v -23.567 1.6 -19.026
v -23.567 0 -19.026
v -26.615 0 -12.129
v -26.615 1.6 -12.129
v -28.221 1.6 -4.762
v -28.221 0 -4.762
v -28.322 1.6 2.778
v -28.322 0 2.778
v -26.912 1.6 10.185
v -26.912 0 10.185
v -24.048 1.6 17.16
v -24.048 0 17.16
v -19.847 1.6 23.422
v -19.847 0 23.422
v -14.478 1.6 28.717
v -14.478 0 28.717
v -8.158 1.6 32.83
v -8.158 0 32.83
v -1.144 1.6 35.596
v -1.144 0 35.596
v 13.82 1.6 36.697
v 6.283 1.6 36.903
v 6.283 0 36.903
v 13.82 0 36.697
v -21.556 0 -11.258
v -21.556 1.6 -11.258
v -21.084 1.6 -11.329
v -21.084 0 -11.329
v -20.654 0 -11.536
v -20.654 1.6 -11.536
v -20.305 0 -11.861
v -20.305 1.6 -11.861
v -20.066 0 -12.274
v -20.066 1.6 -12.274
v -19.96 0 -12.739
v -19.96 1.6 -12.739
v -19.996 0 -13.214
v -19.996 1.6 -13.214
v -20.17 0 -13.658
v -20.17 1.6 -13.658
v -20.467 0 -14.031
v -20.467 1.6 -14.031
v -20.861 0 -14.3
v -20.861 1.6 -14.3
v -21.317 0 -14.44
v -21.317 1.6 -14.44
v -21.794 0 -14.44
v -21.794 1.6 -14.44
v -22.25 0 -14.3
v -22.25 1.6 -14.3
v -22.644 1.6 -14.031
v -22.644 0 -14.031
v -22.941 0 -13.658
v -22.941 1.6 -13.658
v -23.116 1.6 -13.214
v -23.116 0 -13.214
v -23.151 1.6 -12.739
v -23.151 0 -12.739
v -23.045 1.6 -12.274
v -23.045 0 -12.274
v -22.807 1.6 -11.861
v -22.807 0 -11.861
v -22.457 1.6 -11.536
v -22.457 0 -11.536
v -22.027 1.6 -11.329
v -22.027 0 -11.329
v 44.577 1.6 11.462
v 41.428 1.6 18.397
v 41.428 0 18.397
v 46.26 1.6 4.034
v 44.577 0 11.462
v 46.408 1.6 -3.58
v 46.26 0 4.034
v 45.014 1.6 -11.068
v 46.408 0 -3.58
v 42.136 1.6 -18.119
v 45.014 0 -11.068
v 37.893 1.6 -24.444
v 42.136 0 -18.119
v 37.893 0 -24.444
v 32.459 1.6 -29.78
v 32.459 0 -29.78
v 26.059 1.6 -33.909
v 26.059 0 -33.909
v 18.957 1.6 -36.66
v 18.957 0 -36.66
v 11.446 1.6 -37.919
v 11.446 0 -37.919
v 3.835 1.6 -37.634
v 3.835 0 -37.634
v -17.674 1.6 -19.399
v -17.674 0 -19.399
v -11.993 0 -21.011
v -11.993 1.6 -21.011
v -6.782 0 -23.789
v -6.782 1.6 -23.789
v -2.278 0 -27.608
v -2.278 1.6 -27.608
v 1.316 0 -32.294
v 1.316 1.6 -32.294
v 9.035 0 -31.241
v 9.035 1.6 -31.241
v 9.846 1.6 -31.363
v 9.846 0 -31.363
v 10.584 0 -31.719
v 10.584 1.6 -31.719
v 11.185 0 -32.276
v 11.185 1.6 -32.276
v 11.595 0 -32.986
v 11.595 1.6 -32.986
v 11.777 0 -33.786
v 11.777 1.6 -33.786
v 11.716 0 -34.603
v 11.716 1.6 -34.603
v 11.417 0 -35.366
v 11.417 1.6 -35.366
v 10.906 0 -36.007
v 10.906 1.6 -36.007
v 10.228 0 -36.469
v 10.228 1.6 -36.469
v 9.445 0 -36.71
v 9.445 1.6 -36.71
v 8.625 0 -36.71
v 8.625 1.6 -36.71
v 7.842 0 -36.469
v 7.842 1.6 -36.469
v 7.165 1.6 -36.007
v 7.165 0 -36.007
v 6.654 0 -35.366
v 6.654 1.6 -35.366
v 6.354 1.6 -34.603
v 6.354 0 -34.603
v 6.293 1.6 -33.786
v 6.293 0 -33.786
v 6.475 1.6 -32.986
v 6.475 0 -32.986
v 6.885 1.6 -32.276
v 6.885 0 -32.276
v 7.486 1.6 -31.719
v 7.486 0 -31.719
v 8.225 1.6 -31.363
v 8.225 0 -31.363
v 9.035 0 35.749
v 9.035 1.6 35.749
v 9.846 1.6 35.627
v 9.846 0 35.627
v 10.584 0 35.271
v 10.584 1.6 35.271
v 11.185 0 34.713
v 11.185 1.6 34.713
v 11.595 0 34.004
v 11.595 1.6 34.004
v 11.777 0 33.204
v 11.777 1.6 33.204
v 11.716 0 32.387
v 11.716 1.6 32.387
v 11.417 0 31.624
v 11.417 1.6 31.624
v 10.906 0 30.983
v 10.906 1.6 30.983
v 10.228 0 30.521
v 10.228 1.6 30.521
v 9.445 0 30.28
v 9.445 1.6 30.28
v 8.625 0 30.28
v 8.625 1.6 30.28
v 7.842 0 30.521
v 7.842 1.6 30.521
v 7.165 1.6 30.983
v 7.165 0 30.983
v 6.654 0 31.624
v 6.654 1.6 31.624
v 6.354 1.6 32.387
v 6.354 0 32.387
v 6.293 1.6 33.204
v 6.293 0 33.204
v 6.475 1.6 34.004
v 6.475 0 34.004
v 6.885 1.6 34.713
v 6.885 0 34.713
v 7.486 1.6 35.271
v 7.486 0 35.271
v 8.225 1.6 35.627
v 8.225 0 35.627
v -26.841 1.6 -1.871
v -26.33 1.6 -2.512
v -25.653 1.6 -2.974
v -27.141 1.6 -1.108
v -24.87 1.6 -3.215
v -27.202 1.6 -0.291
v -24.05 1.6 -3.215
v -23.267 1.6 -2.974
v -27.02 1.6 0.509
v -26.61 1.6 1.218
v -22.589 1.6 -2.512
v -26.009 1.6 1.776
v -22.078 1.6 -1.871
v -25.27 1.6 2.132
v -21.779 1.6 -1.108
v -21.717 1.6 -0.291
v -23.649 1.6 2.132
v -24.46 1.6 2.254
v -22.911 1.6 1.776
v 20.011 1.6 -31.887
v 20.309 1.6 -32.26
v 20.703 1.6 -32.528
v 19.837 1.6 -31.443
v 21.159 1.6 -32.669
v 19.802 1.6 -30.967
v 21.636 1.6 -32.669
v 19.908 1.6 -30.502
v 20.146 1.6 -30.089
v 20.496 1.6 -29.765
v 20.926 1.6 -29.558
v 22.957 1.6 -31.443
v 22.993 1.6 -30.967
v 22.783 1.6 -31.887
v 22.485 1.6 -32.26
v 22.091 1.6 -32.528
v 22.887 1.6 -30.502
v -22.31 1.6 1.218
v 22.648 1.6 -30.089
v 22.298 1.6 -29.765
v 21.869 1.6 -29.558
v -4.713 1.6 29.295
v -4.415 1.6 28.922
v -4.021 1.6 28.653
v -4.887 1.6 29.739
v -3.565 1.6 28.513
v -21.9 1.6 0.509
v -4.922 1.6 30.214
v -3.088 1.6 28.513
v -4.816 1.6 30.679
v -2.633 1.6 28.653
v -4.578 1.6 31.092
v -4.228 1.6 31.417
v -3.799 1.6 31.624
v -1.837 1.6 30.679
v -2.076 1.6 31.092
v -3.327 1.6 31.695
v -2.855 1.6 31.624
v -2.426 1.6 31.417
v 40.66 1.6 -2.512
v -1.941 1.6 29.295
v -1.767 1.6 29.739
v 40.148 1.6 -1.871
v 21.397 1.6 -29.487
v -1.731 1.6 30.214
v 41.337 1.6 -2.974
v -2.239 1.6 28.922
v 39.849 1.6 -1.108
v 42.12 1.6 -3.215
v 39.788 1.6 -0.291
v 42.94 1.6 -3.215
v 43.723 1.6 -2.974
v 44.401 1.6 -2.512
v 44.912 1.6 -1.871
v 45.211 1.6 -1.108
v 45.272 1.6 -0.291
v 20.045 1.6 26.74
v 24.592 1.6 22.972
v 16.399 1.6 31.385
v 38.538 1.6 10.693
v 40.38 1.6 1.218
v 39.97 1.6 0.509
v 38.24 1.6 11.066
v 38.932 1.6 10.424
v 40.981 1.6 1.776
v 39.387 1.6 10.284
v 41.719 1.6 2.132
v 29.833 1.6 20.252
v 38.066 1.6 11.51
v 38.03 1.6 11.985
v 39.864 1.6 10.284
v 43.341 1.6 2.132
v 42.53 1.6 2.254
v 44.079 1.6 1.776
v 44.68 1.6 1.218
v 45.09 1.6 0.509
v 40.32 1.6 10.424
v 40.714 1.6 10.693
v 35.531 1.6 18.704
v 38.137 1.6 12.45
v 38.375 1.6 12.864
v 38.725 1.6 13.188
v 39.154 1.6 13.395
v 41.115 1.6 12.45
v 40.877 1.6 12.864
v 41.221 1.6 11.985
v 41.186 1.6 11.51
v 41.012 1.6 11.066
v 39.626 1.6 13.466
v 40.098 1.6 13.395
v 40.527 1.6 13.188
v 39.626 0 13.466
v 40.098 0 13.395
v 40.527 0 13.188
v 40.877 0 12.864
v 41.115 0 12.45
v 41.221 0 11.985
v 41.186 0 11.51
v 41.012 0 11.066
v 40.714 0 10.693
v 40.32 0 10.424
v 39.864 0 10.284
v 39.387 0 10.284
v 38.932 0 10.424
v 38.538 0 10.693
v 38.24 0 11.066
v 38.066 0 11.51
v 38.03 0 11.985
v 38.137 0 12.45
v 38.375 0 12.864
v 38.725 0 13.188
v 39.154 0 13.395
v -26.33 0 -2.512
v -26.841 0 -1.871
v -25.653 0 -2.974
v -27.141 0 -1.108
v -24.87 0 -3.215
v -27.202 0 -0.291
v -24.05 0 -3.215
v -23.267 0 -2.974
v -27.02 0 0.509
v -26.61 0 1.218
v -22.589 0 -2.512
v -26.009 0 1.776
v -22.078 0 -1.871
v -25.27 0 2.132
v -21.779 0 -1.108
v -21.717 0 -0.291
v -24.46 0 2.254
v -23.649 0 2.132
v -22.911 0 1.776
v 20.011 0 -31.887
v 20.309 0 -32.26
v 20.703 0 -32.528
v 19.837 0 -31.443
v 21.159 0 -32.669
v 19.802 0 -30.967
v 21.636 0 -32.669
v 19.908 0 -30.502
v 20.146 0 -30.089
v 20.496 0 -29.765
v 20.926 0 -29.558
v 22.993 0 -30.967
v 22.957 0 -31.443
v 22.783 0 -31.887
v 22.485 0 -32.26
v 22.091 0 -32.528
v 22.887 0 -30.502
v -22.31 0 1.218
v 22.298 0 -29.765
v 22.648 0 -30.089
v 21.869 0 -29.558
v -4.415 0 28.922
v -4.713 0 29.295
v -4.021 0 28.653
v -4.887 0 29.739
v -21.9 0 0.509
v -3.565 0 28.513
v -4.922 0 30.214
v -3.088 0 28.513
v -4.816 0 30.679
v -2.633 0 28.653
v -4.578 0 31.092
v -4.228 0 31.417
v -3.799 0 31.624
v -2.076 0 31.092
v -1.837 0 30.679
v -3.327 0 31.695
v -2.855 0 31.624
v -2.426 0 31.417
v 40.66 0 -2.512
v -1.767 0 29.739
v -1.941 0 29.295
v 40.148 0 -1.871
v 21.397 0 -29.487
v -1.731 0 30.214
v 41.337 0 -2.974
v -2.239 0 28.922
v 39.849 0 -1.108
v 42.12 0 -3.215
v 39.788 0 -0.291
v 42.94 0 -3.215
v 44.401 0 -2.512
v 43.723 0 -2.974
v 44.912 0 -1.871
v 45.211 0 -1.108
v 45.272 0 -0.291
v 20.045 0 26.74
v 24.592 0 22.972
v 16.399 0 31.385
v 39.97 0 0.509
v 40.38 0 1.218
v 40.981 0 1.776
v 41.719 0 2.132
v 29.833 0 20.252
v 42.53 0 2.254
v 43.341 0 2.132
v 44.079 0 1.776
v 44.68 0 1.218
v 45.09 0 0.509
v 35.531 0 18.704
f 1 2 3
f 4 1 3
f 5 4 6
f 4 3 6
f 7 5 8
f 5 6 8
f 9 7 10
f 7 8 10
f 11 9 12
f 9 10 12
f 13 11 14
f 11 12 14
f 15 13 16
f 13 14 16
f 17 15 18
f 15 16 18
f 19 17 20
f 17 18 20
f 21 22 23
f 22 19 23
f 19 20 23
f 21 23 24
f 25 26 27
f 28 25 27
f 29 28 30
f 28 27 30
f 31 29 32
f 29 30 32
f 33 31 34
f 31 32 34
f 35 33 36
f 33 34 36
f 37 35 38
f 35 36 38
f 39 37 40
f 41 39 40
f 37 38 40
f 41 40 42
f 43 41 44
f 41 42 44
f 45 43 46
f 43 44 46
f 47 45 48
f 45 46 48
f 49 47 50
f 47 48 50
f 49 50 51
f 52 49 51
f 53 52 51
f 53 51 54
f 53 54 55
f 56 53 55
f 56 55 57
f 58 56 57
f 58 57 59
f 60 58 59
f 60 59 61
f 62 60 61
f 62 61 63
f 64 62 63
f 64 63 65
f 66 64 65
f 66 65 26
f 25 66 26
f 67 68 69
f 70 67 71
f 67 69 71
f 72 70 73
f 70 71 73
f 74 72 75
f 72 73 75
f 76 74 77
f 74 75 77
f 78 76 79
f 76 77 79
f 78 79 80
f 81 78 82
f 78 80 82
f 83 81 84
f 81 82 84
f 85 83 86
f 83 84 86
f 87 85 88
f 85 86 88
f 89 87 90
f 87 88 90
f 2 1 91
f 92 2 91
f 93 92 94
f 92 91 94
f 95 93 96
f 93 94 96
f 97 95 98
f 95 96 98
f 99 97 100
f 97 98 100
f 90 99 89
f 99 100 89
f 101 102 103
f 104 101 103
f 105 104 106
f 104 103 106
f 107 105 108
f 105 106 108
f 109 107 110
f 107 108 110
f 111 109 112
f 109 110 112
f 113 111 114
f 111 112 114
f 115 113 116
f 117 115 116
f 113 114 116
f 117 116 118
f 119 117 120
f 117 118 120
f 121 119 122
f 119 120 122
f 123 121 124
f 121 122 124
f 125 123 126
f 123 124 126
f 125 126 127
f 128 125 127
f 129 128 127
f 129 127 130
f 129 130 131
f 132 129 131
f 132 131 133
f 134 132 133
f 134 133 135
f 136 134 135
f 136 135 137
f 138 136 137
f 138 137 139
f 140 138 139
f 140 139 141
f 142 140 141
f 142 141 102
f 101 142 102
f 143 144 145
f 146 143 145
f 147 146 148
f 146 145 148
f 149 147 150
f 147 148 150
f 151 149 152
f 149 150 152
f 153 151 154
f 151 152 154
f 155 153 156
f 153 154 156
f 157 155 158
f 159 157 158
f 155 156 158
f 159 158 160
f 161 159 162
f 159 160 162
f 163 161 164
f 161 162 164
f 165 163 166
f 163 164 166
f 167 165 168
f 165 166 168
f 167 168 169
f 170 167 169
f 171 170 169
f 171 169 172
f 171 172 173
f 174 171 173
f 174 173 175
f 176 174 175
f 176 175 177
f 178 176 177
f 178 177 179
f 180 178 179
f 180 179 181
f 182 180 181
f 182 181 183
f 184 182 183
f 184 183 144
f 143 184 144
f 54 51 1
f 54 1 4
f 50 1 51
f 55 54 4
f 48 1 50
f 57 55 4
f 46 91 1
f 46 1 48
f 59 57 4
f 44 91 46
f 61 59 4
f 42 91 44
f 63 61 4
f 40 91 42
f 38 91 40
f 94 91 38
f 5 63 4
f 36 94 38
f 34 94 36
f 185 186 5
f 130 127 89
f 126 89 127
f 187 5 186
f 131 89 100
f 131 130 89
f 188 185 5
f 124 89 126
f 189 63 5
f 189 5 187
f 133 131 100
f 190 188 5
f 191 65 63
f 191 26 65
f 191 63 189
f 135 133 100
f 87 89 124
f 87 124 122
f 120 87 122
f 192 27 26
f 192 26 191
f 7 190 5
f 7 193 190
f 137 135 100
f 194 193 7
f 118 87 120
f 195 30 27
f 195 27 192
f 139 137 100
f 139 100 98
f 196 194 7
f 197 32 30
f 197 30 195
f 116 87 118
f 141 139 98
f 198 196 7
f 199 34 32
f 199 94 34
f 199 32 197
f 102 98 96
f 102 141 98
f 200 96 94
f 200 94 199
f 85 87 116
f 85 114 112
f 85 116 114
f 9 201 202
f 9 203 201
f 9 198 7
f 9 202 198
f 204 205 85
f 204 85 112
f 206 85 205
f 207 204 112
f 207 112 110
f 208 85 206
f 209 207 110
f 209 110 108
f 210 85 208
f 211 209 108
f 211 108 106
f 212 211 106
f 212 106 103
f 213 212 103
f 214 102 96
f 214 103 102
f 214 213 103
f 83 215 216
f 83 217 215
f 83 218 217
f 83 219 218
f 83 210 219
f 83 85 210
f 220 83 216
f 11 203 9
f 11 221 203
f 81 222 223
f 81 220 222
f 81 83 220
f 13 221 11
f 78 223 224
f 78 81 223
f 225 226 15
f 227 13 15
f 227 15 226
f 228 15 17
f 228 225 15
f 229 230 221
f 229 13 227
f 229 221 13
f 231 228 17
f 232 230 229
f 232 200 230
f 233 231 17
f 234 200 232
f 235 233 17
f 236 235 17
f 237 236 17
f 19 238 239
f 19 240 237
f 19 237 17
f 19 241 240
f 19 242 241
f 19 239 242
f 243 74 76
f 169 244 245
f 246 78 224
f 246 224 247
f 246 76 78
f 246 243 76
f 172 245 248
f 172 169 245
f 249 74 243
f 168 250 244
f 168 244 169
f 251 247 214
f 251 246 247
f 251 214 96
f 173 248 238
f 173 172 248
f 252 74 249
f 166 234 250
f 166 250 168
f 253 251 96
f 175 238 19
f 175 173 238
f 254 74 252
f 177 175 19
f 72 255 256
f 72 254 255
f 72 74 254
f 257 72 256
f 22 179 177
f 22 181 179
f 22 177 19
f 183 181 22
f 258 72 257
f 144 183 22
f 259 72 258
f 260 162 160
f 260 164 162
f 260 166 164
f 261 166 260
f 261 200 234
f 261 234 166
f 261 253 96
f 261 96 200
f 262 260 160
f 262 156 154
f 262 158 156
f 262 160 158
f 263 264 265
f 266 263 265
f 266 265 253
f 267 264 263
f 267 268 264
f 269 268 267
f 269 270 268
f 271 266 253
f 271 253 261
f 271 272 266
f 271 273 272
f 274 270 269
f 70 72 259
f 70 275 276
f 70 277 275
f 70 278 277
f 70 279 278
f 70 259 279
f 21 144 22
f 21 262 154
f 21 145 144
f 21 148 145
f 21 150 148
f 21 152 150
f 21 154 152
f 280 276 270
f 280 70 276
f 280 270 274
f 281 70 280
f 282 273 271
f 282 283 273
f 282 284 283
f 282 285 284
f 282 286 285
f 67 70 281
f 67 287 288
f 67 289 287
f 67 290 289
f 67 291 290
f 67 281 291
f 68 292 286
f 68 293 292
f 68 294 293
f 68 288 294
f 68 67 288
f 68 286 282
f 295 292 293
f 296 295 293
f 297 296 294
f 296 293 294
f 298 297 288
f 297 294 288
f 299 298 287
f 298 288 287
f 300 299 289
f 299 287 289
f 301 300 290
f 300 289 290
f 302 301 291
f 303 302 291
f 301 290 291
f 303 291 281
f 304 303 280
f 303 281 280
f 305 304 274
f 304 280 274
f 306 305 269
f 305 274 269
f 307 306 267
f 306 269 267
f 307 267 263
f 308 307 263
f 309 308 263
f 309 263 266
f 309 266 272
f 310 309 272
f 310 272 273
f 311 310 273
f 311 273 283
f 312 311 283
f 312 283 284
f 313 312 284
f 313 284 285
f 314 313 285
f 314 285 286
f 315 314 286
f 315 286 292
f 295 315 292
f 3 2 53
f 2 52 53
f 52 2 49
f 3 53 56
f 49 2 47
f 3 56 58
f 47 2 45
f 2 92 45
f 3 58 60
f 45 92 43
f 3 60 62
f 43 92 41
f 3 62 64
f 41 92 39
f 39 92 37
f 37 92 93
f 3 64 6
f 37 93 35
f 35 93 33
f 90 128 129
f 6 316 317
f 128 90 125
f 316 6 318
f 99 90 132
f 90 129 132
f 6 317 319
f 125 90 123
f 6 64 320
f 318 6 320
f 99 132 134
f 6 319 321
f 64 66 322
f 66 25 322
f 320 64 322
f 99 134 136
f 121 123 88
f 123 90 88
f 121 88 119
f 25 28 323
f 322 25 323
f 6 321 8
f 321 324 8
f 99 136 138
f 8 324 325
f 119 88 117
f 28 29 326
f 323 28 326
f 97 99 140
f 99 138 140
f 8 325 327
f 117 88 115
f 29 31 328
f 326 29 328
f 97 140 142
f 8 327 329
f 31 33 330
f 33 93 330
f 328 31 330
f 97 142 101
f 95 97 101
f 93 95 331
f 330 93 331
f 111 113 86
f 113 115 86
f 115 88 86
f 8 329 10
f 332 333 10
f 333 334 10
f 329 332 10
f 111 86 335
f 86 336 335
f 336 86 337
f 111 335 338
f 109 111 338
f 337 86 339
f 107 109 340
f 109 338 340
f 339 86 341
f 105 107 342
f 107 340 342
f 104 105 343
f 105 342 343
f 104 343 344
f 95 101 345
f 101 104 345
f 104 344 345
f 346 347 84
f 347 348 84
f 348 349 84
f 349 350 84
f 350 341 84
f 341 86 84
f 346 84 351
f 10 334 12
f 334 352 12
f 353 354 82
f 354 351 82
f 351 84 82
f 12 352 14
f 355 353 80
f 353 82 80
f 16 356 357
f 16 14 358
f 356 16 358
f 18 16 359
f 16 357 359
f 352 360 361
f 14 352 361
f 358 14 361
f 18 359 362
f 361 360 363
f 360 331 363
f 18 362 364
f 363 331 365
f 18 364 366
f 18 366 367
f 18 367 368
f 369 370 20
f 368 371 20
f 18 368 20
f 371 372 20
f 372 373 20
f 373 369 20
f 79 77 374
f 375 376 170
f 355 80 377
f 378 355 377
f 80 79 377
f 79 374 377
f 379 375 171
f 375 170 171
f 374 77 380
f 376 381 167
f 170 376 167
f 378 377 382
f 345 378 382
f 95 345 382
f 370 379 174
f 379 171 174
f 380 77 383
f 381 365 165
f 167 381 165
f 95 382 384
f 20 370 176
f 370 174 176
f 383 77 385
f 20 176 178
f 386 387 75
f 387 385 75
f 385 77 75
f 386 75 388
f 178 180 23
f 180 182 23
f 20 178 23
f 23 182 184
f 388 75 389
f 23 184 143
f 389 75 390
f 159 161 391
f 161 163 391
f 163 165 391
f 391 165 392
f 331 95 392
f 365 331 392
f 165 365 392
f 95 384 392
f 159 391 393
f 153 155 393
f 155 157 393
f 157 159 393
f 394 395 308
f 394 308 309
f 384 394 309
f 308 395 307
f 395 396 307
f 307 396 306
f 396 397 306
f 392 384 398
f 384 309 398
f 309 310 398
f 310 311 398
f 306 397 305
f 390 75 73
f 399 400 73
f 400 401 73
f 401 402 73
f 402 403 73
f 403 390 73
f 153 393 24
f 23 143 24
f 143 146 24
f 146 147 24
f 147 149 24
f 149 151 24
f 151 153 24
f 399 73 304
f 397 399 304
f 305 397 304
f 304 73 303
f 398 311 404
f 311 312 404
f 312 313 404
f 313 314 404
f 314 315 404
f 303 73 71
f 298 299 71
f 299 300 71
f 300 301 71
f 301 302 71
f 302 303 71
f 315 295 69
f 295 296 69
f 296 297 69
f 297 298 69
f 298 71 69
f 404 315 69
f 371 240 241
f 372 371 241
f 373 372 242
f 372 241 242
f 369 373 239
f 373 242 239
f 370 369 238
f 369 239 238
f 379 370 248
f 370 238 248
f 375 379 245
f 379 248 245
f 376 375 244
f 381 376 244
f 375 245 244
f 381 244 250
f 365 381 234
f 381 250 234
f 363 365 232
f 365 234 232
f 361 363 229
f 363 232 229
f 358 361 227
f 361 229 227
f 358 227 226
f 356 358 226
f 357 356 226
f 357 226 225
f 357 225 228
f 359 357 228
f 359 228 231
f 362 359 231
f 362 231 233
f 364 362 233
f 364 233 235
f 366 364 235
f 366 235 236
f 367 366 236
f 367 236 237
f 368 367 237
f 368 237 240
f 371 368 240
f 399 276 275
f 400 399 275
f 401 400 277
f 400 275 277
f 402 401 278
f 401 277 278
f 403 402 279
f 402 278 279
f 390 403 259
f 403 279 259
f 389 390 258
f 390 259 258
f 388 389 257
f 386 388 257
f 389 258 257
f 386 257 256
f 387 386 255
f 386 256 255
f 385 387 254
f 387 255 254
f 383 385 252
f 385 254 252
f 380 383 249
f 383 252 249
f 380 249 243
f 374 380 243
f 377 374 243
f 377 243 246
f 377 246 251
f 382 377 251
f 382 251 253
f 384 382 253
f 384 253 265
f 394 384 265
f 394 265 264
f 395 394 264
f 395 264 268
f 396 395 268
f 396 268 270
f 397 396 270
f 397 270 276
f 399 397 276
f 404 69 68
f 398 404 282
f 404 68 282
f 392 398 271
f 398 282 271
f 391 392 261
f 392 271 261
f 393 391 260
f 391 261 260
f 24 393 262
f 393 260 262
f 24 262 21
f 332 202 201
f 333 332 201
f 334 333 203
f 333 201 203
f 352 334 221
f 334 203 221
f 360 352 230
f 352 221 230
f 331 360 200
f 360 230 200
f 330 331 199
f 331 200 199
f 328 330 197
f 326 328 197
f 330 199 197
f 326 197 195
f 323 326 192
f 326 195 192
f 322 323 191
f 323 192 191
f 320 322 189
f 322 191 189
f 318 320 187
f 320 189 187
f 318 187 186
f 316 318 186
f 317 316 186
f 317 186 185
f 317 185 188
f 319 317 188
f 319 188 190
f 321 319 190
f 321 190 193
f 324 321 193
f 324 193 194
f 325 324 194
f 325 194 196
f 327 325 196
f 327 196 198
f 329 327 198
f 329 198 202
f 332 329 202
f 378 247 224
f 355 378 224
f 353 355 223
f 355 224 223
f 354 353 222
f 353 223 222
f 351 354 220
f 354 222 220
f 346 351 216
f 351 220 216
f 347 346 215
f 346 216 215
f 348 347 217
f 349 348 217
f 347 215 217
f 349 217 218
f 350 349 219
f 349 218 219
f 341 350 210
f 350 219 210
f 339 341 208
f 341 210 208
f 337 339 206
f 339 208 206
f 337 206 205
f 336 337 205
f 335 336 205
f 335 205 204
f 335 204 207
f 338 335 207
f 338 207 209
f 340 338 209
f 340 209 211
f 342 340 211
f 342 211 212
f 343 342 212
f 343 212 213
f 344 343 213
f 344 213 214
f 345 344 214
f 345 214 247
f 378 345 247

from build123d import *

# Parameters (mm, degrees)
SKETCH1_R           = 37.5
BOSS_EXTRUDE1_DEPTH = 1.6
SKETCH3_R           = 1.6
SKETCH3_R_2         = 2.75
CUT_EXTRUDE1_DEPTH  = 10
SKETCH6_R           = 27.729942467
CUT_EXTRUDE2_DEPTH  = 10


with BuildPart() as part:
    # Sketch1 → Boss-Extrude1 (new body)
    with BuildSketch(Plane(origin=(0, 0, 0), x_dir=(1, 0, 0), z_dir=(0, 1, 0))):
        with Locations(Location((9.035122573, 0.49610085, 0), (0, 0, 270))):
            Circle(SKETCH1_R)
    extrude(amount=BOSS_EXTRUDE1_DEPTH)

    # Sketch3 → Cut-Extrude1 (cut)
    with BuildSketch(Plane(origin=(0, 1.6, 0), x_dir=(1, 0, 0), z_dir=(0, 1, 0))):
        with Locations(Location((-3.32689501, -30.094686593, 0), (0, 0, 270))):
            Circle(SKETCH3_R)
        with Locations(Location((-24.459801803, 0.49610085, 0), (0, 0, 270))):
            Circle(SKETCH3_R_2)
        with Locations(Location((9.035122573, 33.991025226, 0), (0, 0, 270))):
            Circle(SKETCH3_R_2)
        with Locations(Location((42.530046949, 0.49610085, 0), (0, 0, 270))):
            Circle(SKETCH3_R_2)
        with Locations(Location((9.035122573, -32.998823526, 0), (0, 0, 270))):
            Circle(SKETCH3_R_2)
        with Locations(Location((-21.55566487, 12.858118433, 0), (0, 0, 270))):
            Circle(SKETCH3_R)
        with Locations(Location((21.397140156, 31.086888293, 0), (0, 0, 270))):
            Circle(SKETCH3_R)
        with Locations(Location((39.625910016, -11.865916733, 0), (0, 0, 270))):
            Circle(SKETCH3_R)
    extrude(amount=-CUT_EXTRUDE1_DEPTH, mode=Mode.SUBTRACT)

    # Sketch6 → Cut-Extrude2 (cut)
    with BuildSketch(Plane(origin=(0, 1.6, 0), x_dir=(1, 0, 0), z_dir=(0, 1, 0))):
        with Locations((39.912604148, -46.085156826)):
            Circle(SKETCH6_R)
        with Locations((-22.36020617, 46.729917134)):
            Circle(SKETCH6_R)
    extrude(amount=-CUT_EXTRUDE2_DEPTH, mode=Mode.SUBTRACT)


solid = part.part
